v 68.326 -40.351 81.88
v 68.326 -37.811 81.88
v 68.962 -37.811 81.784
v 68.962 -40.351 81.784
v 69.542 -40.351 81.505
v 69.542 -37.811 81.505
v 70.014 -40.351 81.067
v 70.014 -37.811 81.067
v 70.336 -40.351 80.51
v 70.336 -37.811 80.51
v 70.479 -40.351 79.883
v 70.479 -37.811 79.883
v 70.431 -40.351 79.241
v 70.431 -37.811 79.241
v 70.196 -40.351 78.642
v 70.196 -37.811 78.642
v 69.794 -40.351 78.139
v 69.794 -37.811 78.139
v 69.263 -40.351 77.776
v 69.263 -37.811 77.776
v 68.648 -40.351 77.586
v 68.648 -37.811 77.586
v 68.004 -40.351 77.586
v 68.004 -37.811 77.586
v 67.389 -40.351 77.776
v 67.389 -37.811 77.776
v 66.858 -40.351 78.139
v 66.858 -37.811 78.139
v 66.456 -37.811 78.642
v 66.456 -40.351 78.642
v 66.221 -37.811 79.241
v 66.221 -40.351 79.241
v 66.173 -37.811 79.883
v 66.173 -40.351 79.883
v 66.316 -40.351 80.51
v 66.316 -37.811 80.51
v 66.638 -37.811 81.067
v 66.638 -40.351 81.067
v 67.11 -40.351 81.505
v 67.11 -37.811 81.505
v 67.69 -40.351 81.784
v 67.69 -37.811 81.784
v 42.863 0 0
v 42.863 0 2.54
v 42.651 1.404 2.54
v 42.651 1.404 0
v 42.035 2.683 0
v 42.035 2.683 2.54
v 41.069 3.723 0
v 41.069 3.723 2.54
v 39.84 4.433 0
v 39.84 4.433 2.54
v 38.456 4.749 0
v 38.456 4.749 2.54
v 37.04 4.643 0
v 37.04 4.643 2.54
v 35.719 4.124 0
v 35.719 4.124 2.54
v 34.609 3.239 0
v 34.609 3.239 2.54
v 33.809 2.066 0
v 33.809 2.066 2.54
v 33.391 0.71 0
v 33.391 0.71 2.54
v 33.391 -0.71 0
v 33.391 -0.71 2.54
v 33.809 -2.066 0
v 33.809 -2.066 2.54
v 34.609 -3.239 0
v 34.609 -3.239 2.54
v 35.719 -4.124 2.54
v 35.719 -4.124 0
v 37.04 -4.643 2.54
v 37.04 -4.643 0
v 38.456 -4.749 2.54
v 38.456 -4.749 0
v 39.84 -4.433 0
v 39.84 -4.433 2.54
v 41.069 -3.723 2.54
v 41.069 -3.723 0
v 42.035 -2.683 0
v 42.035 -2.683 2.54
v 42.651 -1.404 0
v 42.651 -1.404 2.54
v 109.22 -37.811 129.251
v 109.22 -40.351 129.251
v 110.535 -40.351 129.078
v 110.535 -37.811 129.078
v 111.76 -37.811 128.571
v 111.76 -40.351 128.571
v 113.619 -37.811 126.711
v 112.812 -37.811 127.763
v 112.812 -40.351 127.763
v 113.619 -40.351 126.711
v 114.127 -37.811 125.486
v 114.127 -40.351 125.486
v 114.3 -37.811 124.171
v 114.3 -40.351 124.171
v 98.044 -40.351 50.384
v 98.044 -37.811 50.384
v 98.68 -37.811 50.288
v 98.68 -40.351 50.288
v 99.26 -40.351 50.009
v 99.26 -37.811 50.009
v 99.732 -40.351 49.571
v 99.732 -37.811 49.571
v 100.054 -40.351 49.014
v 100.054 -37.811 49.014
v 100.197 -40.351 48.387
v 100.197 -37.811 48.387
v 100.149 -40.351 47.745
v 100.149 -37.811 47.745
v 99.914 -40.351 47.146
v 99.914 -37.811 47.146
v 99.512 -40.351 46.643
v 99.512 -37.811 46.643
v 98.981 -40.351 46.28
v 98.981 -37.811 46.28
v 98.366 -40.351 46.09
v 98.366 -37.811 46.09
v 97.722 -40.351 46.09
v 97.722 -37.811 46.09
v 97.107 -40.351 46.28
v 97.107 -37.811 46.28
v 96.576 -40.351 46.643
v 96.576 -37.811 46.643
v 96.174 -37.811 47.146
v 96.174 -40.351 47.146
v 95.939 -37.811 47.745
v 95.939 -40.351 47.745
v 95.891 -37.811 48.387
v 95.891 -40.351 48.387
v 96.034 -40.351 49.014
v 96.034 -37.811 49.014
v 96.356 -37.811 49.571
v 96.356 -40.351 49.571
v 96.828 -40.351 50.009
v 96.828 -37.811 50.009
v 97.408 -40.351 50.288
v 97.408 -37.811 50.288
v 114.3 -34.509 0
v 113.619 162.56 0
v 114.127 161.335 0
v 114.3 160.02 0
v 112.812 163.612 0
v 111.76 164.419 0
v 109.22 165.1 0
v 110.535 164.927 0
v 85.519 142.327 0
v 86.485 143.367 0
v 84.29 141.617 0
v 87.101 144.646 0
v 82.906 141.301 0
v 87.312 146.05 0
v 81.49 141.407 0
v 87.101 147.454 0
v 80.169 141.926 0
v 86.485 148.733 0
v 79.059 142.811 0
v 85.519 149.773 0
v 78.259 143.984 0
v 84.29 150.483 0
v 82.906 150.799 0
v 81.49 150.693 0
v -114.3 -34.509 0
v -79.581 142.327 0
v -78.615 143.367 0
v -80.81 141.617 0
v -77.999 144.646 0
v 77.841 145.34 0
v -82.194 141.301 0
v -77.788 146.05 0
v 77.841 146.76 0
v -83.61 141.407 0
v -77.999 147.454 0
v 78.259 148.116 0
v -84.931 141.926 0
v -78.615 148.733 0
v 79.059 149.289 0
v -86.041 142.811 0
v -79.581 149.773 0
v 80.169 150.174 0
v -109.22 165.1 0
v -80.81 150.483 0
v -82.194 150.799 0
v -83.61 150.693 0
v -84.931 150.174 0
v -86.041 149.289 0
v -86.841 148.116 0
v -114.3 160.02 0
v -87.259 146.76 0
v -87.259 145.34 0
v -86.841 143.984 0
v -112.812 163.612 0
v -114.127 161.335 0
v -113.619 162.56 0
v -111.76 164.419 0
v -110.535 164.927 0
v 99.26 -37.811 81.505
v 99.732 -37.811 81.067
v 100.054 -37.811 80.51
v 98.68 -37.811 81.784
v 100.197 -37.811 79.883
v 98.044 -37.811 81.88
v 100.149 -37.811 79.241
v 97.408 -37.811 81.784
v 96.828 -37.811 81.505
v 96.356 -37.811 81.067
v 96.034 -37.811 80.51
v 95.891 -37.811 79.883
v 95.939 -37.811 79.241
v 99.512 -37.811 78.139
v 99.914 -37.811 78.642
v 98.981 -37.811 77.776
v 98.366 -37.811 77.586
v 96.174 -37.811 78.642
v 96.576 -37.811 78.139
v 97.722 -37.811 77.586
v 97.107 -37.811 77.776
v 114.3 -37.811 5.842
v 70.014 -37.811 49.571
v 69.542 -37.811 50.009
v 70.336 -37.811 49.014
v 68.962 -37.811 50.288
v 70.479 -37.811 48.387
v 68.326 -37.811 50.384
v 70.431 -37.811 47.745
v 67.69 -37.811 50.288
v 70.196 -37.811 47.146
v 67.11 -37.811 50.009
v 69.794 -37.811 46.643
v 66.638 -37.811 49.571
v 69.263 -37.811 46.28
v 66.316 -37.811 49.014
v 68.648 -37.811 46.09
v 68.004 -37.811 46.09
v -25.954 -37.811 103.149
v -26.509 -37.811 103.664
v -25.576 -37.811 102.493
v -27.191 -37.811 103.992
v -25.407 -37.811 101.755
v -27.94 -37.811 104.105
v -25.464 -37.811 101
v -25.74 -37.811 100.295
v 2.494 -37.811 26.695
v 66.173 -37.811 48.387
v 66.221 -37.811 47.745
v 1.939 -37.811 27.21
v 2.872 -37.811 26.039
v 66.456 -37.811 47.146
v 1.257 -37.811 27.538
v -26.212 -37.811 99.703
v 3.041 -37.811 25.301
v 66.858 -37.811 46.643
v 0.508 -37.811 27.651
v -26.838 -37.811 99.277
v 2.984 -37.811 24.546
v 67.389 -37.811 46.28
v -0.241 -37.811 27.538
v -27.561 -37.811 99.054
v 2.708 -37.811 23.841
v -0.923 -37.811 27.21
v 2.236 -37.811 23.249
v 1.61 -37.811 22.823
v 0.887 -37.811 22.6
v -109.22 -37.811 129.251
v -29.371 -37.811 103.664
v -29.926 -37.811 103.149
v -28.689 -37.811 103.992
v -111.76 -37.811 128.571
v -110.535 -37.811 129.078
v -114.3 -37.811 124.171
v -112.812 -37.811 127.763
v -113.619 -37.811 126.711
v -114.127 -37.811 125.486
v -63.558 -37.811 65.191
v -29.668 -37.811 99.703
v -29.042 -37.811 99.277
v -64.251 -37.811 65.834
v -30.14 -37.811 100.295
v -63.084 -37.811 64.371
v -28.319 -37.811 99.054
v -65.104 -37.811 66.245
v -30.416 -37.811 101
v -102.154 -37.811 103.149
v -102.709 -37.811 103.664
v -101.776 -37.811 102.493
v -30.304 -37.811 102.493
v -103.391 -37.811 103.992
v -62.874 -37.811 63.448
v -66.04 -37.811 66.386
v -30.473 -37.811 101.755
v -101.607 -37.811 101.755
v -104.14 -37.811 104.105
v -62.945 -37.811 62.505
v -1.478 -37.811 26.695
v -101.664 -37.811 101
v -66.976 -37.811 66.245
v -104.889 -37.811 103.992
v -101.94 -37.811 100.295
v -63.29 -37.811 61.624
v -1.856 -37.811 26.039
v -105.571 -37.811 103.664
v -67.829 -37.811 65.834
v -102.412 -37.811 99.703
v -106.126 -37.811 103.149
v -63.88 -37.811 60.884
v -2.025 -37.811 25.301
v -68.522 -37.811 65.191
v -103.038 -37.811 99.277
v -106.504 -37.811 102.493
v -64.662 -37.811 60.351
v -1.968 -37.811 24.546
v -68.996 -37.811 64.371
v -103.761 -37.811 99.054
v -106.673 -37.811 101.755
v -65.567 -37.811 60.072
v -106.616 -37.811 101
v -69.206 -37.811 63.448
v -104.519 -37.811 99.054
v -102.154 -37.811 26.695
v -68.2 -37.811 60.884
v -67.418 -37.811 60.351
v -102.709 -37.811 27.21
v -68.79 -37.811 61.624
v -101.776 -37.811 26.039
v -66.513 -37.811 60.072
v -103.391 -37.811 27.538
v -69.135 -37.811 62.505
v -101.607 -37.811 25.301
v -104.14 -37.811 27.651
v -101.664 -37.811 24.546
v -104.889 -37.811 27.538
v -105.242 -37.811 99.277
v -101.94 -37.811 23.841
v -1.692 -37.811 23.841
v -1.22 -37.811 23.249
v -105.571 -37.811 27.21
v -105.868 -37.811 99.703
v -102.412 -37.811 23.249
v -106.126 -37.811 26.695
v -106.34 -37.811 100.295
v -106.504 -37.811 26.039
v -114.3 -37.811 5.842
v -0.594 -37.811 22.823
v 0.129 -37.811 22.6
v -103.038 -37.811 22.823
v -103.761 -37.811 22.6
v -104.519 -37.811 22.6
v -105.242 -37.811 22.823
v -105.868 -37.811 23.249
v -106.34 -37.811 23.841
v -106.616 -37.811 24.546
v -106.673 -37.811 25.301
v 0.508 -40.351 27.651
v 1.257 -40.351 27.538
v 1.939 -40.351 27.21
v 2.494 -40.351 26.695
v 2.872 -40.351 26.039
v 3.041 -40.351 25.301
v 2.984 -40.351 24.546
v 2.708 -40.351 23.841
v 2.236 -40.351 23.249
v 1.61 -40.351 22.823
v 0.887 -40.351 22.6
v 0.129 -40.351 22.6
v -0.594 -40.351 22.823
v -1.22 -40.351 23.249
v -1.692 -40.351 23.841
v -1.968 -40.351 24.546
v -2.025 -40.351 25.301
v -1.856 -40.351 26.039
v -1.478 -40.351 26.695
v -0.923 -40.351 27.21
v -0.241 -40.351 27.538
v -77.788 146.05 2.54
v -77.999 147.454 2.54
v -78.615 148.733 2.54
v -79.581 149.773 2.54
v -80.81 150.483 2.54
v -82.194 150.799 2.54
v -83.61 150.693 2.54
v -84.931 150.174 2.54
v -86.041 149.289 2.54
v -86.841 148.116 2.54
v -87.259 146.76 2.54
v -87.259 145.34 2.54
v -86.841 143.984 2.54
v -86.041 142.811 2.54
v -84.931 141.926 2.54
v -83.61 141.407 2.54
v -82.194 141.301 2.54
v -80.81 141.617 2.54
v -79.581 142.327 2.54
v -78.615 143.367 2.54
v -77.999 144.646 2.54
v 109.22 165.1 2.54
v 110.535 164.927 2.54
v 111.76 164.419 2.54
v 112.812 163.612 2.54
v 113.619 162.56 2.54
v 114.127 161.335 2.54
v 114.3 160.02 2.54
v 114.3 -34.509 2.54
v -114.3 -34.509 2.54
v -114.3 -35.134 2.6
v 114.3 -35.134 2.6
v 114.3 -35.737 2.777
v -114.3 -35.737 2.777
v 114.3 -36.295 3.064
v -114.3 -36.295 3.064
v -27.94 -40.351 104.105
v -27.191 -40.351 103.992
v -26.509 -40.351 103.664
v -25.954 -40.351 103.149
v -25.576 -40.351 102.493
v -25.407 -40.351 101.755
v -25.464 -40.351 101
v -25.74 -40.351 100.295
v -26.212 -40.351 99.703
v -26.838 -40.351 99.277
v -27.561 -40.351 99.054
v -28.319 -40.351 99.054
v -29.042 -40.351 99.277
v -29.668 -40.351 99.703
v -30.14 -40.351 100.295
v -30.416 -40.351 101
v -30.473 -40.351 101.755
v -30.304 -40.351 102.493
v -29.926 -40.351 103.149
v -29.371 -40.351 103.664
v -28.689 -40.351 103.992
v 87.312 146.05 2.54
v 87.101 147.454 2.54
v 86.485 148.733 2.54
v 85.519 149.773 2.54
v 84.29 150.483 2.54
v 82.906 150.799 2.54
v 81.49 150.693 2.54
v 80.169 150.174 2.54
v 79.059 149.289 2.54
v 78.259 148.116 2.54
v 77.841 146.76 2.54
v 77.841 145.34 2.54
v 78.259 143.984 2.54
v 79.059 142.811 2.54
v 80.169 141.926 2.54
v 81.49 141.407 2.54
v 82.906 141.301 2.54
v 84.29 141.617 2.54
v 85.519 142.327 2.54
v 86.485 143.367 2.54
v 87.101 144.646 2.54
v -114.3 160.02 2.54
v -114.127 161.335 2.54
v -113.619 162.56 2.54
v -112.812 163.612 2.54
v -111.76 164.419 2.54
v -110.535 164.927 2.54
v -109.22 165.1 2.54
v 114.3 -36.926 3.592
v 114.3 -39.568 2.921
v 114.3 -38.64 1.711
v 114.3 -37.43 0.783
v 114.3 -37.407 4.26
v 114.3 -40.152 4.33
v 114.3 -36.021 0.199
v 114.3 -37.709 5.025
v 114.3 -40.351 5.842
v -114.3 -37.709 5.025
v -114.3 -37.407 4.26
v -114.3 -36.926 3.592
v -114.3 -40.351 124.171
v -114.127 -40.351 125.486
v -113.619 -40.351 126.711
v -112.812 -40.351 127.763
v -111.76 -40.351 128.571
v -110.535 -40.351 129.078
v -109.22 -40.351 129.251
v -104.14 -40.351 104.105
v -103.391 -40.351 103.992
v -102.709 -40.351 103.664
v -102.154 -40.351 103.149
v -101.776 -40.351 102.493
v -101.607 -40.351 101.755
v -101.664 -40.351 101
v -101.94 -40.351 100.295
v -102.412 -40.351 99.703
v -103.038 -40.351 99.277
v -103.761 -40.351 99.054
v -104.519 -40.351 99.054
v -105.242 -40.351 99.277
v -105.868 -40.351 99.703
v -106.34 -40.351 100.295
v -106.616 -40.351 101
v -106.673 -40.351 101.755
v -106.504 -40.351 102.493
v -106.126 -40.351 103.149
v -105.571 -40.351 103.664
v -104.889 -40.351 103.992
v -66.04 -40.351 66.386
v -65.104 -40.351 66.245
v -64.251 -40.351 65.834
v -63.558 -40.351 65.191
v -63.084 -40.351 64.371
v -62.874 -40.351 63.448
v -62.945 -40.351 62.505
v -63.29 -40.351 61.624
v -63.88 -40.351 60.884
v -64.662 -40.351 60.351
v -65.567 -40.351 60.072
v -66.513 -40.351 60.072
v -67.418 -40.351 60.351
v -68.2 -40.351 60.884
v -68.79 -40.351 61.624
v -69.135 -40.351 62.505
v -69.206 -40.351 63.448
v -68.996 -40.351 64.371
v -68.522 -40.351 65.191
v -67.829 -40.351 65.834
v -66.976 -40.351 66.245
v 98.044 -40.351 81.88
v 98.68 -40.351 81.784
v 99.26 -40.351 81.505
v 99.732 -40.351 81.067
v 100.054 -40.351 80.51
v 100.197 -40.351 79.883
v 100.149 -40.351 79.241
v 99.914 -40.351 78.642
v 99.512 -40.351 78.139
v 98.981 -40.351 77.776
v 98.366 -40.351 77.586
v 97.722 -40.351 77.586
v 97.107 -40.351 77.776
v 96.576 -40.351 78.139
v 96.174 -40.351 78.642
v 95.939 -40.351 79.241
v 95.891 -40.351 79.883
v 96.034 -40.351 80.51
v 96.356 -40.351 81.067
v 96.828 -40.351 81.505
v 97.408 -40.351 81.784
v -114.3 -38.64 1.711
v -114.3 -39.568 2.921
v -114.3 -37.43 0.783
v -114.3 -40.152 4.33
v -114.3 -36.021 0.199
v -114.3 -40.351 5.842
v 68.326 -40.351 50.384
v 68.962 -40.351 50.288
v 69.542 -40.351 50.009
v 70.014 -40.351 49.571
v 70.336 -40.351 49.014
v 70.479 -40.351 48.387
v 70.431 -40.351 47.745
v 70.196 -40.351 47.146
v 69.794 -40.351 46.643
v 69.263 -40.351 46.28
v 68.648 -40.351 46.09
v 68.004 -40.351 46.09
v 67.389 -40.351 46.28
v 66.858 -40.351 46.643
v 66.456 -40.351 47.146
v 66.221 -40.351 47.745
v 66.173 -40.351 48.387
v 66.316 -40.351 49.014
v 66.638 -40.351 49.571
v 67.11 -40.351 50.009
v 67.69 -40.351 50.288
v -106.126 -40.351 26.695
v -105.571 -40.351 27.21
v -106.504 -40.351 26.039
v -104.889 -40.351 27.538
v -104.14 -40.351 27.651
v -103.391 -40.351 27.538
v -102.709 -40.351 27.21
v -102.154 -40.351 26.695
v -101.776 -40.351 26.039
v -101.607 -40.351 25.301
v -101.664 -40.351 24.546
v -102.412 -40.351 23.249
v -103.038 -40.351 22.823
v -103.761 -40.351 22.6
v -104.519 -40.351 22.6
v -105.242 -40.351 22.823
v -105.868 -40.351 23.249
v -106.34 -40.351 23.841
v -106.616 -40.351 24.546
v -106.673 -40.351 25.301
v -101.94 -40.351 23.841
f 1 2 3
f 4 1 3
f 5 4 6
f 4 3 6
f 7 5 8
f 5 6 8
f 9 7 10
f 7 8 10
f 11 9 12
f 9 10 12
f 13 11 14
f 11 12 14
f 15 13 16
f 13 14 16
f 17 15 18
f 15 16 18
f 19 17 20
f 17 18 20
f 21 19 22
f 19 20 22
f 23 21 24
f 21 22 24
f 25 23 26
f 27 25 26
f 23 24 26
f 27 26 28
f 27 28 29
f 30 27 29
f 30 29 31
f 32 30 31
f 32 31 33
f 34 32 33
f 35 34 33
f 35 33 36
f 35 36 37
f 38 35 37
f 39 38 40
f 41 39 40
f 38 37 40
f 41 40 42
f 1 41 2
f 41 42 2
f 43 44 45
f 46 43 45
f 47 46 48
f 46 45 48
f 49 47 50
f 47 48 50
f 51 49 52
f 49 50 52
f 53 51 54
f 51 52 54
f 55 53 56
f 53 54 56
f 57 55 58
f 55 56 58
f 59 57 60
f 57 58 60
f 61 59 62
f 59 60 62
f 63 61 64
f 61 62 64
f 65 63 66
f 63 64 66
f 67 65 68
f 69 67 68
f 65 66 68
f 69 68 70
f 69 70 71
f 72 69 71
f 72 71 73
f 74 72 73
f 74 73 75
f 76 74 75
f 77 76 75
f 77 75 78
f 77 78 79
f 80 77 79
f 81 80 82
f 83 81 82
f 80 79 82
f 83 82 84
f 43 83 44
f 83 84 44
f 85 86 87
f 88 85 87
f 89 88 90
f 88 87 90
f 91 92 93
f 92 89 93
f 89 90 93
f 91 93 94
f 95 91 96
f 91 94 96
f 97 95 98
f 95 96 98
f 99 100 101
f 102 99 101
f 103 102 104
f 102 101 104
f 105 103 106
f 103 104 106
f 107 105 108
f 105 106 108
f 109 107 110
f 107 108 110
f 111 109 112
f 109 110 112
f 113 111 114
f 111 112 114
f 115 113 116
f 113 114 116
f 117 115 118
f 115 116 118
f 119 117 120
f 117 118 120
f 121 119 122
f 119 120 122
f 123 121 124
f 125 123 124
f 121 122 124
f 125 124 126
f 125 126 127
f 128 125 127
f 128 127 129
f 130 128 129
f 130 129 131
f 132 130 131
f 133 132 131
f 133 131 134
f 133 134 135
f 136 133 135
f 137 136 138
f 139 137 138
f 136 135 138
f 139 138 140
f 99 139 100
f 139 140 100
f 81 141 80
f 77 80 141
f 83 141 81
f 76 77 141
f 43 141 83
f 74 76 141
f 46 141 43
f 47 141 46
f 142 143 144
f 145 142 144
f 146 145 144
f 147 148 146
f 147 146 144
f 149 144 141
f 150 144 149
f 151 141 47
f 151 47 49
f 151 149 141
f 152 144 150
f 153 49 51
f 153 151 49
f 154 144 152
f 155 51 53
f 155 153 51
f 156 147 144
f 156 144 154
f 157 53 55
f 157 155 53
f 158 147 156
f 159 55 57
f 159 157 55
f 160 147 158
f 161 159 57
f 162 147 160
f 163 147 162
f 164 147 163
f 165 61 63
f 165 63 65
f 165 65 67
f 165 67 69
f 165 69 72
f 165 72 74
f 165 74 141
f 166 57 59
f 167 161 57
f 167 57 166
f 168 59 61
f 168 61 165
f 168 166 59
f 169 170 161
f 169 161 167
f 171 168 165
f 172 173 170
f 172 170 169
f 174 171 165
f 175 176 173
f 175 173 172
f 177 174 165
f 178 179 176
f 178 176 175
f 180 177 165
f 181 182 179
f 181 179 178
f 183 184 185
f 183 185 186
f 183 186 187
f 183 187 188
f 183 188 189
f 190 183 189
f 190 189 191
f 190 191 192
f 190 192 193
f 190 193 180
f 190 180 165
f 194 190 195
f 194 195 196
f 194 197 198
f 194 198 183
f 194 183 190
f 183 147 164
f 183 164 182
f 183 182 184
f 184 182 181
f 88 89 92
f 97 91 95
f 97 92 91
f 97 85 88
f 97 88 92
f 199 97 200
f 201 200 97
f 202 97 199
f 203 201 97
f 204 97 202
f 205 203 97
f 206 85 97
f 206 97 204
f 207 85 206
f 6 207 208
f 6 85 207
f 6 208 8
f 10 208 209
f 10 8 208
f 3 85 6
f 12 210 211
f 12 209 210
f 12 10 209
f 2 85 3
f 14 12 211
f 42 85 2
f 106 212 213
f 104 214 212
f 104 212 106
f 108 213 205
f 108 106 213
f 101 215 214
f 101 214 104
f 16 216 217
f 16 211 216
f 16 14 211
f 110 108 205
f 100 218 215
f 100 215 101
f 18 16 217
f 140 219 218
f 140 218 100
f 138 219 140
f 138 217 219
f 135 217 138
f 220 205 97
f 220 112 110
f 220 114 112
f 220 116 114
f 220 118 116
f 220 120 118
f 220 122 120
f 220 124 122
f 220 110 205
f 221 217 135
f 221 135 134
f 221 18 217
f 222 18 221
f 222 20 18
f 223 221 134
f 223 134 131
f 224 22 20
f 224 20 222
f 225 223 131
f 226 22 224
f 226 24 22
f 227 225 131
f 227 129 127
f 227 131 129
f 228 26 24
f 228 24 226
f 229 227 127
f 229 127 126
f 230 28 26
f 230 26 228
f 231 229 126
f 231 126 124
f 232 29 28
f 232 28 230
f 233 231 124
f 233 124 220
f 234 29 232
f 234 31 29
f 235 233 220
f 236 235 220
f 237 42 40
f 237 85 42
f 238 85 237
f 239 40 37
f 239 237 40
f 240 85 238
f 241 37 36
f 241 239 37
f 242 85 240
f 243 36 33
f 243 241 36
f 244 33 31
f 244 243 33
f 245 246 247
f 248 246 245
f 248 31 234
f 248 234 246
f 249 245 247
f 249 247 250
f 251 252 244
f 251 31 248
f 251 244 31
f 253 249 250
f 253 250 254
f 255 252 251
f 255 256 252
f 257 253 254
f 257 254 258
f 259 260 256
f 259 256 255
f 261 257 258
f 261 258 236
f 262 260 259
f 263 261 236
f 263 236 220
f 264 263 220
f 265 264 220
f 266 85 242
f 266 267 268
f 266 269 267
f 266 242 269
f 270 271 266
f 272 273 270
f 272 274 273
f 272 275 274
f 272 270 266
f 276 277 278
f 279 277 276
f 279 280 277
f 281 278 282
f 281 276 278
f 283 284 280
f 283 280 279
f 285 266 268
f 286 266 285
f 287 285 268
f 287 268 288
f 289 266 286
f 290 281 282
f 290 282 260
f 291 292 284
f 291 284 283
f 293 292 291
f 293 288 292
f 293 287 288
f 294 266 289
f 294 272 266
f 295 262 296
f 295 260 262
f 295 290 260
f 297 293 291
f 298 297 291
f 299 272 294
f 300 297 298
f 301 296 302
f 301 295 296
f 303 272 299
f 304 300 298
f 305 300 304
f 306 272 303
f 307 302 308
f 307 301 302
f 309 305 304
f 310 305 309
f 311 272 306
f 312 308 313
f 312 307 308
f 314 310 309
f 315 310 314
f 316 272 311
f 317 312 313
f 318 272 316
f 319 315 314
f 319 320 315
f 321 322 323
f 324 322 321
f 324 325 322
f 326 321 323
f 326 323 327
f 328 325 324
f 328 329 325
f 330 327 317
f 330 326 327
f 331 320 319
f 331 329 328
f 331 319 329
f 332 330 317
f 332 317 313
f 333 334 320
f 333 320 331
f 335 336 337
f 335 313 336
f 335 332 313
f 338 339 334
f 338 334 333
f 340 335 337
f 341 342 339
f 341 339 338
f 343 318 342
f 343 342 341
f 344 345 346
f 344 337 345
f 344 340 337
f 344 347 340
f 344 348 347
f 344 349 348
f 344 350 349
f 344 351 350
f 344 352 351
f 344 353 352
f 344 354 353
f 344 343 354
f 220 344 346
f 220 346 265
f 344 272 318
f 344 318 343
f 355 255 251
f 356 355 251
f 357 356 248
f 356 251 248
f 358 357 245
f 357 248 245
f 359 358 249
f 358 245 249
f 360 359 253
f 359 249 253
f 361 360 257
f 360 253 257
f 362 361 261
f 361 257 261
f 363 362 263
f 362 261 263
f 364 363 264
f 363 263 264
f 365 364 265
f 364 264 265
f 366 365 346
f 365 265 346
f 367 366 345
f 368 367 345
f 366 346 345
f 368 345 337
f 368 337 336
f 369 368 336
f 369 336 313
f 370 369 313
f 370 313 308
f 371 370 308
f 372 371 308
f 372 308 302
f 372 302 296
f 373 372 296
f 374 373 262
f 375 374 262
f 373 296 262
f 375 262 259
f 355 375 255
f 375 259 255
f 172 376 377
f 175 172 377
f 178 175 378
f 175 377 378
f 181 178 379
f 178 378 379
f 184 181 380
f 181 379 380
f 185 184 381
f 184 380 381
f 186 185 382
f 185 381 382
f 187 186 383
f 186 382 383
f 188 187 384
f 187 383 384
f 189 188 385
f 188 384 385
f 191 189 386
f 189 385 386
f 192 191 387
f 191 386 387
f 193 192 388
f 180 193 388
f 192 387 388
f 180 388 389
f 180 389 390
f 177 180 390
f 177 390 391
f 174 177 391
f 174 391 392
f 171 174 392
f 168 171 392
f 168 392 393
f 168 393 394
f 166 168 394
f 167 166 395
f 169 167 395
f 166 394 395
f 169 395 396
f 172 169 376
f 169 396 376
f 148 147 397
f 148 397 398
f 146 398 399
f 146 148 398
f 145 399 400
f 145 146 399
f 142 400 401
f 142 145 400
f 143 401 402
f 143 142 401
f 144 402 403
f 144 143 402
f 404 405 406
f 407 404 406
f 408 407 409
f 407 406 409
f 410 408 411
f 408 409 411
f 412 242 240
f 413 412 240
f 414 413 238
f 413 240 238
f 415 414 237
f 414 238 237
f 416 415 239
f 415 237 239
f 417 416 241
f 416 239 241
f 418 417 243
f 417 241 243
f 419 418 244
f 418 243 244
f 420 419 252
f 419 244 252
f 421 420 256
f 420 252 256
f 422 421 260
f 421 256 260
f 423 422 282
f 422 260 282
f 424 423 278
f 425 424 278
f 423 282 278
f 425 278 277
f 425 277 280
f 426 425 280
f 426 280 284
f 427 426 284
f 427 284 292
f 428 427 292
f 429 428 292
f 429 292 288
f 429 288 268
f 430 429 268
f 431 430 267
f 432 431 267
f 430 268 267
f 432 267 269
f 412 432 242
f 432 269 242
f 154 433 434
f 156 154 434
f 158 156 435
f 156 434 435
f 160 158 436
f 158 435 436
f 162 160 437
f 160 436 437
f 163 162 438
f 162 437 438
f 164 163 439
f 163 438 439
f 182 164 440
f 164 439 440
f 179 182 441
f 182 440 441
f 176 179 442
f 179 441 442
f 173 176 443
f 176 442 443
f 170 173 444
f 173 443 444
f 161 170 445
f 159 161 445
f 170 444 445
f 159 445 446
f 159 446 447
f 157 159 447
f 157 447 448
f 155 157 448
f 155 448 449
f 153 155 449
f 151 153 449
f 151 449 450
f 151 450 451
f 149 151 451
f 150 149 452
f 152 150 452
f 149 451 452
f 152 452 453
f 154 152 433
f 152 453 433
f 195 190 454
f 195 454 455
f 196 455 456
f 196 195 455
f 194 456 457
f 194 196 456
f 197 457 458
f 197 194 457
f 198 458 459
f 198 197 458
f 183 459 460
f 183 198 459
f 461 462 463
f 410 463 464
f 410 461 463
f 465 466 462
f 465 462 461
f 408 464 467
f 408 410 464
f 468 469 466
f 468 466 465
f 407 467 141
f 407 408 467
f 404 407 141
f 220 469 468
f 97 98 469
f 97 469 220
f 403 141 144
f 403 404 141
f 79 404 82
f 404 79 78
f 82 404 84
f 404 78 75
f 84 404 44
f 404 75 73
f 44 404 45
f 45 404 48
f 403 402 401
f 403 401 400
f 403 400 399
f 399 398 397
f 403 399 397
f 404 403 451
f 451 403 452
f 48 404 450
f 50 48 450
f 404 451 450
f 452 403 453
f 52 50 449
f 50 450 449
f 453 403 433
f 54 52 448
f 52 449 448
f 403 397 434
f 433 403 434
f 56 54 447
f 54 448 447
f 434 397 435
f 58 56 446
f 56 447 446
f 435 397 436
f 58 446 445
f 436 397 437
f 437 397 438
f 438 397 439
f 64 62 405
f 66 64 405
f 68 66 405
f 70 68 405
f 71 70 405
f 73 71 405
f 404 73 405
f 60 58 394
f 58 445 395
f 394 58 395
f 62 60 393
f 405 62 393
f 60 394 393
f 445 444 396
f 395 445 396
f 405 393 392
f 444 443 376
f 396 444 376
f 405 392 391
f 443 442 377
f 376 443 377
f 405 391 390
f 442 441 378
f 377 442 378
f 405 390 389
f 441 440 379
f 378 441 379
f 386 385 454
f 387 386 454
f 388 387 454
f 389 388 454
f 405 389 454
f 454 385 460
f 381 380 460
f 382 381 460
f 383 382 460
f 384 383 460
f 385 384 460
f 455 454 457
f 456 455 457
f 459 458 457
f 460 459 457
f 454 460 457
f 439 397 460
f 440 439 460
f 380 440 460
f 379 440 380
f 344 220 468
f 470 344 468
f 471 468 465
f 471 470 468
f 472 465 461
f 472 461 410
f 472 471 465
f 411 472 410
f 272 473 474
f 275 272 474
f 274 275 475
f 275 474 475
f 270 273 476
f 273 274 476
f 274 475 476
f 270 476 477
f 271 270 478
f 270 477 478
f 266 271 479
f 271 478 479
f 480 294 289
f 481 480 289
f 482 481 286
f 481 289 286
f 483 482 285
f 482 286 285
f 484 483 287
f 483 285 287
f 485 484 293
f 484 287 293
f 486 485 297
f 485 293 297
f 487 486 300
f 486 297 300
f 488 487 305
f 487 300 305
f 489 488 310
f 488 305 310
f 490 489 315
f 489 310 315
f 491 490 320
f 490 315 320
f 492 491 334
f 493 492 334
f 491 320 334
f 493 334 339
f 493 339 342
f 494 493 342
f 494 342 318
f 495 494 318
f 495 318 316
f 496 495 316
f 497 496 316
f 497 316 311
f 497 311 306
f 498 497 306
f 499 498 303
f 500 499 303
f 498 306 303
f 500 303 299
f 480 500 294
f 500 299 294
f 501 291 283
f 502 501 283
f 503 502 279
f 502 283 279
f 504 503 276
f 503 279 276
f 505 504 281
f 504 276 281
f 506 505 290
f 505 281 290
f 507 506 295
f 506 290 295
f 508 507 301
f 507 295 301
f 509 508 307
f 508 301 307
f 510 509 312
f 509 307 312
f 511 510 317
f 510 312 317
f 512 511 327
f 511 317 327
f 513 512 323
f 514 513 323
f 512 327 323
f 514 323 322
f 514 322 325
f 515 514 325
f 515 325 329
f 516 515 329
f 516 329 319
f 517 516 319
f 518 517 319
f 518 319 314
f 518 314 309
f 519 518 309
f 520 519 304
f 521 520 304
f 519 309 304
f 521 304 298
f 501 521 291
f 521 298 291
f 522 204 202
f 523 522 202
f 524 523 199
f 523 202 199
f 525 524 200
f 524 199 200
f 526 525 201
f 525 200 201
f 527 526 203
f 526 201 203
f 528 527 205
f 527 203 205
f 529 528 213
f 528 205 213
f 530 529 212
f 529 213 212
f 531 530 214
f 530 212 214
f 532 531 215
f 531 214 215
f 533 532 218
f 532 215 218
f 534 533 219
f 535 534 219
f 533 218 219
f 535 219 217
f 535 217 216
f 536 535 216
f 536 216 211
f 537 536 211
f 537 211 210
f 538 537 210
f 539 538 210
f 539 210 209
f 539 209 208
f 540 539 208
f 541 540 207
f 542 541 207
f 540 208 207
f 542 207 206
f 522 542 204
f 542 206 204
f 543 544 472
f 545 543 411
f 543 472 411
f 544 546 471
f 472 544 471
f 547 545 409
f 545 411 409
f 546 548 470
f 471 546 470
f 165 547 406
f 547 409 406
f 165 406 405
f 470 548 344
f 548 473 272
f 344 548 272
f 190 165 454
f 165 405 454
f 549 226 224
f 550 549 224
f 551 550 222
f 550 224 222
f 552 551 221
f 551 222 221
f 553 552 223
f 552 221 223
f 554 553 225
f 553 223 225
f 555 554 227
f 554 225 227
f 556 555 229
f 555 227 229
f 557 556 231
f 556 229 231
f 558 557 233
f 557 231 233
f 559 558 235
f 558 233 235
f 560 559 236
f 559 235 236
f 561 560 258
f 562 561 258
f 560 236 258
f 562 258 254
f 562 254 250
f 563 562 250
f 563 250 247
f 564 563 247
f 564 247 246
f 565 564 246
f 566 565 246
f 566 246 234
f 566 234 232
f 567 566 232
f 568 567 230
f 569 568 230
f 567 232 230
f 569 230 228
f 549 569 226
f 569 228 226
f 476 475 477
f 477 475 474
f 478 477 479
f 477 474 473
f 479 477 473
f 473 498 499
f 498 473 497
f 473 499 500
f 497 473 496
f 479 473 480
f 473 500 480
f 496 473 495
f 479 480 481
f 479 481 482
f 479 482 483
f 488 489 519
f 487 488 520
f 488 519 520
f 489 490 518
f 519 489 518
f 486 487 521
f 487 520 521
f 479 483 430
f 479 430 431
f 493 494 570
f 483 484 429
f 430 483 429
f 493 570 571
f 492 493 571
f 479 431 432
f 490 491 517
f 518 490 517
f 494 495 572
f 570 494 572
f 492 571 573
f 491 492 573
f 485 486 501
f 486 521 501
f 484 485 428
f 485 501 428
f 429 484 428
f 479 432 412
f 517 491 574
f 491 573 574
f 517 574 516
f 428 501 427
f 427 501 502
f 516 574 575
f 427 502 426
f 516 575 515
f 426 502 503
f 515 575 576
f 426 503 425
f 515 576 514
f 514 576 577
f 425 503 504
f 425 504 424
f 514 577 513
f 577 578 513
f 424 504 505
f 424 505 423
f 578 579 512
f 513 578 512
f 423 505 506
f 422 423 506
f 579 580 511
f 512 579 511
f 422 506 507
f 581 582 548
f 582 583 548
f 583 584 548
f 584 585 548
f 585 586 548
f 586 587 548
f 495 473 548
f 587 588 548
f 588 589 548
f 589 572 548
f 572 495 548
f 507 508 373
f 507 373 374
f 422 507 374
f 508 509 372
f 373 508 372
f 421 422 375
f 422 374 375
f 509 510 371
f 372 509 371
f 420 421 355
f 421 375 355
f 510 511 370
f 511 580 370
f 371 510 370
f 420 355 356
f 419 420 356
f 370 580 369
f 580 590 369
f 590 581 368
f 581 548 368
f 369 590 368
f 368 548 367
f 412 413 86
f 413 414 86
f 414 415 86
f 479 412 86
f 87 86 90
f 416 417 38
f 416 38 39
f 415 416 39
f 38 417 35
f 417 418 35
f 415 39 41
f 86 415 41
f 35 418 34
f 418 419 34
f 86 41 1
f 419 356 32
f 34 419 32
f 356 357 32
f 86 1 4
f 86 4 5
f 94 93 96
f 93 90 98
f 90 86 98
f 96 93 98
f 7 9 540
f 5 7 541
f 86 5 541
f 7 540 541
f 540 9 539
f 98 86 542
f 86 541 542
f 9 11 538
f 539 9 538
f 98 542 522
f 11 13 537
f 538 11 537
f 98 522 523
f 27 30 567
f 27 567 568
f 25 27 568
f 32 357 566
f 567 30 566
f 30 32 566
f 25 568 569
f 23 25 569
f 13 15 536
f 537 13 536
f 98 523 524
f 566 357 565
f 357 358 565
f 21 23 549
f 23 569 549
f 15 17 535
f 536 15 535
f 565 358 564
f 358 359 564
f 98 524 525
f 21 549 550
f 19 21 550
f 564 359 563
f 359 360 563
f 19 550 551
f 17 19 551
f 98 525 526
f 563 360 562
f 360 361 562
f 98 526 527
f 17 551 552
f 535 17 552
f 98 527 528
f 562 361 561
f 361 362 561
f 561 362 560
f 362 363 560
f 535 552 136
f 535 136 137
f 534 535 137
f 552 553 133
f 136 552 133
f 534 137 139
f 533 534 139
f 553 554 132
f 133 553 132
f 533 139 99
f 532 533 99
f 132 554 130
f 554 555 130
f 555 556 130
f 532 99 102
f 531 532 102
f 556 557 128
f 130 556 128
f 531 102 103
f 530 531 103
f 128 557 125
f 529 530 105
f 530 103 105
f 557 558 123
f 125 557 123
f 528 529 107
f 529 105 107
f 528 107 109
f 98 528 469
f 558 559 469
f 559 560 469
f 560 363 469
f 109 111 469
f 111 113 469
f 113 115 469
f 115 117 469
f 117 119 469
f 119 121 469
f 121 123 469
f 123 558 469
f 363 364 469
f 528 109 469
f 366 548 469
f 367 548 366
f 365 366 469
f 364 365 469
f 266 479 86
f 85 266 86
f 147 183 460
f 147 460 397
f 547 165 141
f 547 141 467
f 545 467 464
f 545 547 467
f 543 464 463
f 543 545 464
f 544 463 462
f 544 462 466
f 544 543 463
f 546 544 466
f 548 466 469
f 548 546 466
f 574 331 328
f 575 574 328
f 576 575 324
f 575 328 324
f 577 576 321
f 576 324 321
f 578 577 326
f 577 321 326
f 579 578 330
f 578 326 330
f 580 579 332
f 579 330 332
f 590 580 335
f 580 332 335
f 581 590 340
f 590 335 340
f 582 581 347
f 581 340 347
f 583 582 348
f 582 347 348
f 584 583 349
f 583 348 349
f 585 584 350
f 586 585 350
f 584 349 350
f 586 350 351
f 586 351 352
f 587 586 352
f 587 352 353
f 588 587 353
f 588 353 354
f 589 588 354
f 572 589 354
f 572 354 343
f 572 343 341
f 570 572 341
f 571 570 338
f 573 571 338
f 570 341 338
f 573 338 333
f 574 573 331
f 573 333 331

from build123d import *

# Parameters (mm, degrees)
BOSS_EXTRUDE1_DEPTH      = 2.54
SKETCHED_START           = -165.1
SKETCHED_BEND1_OUTLINE_W = 228.6
SKETCHED_BEND1_OUTLINE_H = 2.54
SKETCHED_BEND1_DEPTH     = 125.300208363
SKETCHED_START_2         = -40.351159597
SKETCHED_BEND1_2_DEPTH   = 4.05656796
SKETCHED_START_3         = -114.3
SKETCHED_BEND1_3_DEPTH   = 228.6
SKETCHED_BEND1_4_DEPTH   = 228.6
SKETCH8_R                = 2.54
SKETCH8_R_2              = 3.175
SKETCH8_R_3              = 2.159
CUT_EXTRUDE2_DEPTH       = 2.54
SKETCH29_R               = 4.7625
CUT_EXTRUDE3_DEPTH       = 2.54


with BuildPart() as part:
    # Sketch2 → Boss-Extrude1 (new body)
    with BuildSketch(Plane.XY):
        with BuildLine():
            Line((109.22, -165.1), (-109.22, -165.1))
            ThreePointArc((-109.22, -165.1), (-112.812102448, -163.612102448), (-114.3, -160.02))
            Line((-114.3, -160.02), (-114.3, 160.02))
            ThreePointArc((-114.3, 160.02), (-112.812102448, 163.612102448), (-109.22, 165.1))
            Line((-109.22, 165.1), (109.22, 165.1))
            ThreePointArc((109.22, 165.1), (112.812102448, 163.612102448), (114.3, 160.02))
            Line((114.3, 160.02), (114.3, -160.02))
            ThreePointArc((114.3, -160.02), (112.812102448, -163.612102448), (109.22, -165.1))
        make_face()
    extrude(amount=BOSS_EXTRUDE1_DEPTH)

    # Sketched Bend1: read off the stored shape, not the designer's step
    # Sketched Bend1 outline → Sketched Bend1 (cut)
    with BuildSketch(Plane(origin=(0, 0, 0), x_dir=(1, 0, 0), z_dir=(0, 1, 0)).offset(SKETCHED_START)):
        with Locations((0, -1.27)):
            Rectangle(SKETCHED_BEND1_OUTLINE_W, SKETCHED_BEND1_OUTLINE_H)
    extrude(amount=SKETCHED_BEND1_DEPTH, mode=Mode.SUBTRACT)

    # Sketched Bend1 2 outline → Sketched Bend1 2 (add)
    with BuildSketch(Plane(origin=(0, 0, 0), x_dir=(1, 0, 0), z_dir=(0, 1, 0)).offset(SKETCHED_START_2)):
        with BuildLine():
            Line((114.3, -124.171159597), (114.3, -2.54))
            Line((114.3, -2.54), (-114.3, -2.54))
            Line((-114.3, -2.54), (-114.3, -124.171159597))
            ThreePointArc((-114.3, -124.171159597), (-112.812102448, -127.763262045), (-109.22, -129.251159597))
            Line((-109.22, -129.251159597), (109.22, -129.251159597))
            ThreePointArc((109.22, -129.251159597), (112.812102448, -127.763262045), (114.3, -124.171159597))
        make_face()
    extrude(amount=SKETCHED_BEND1_2_DEPTH)

    # Sketched Bend1 3 outline → Sketched Bend1 3 (cut)
    with BuildSketch(Plane.YZ.offset(SKETCHED_START_3)):
        with BuildLine():
            Line((-36.294591637, 129.251159597), (-37.811159597, 129.251159597))
            Line((-37.811159597, 129.251159597), (-37.811159597, 5.842))
            ThreePointArc((-37.811159597, 5.842), (-37.407322859, 4.259642992), (-36.294591637, 3.064332557))
            Line((-36.294591637, 3.064332557), (-36.294591637, 129.251159597))
        make_face()
        with BuildLine():
            ThreePointArc((-34.509159597, 0), (-38.640077413, 1.711082184), (-40.351159597, 5.842))
            Line((-40.351159597, 5.842), (-40.351159597, 2.54))
            Line((-40.351159597, 2.54), (-39.799791637, 2.54))
            Line((-39.799791637, 2.54), (-39.799791637, 0))
            Line((-39.799791637, 0), (-34.509159597, 0))
        make_face()
    extrude(amount=SKETCHED_BEND1_3_DEPTH, mode=Mode.SUBTRACT)

    # Sketched Bend1 4 outline → Sketched Bend1 4 (add)
    with BuildSketch(Plane.YZ.offset(SKETCHED_START_3)):
        with BuildLine():
            ThreePointArc((-34.509159597, 2.54), (-35.439575122, 2.673793733), (-36.294591637, 3.064332557))
            Line((-36.294591637, 3.064332557), (-36.294591637, 2.54))
            Line((-36.294591637, 2.54), (-34.509159597, 2.54))
        make_face()
    extrude(amount=SKETCHED_BEND1_4_DEPTH)

    # Sketch8 → Cut-Extrude2 (cut)
    with BuildSketch(Plane(origin=(0, -37.811159597, 0), x_dir=(1, 0, 0), z_dir=(0, 1, 0))):
        with Locations(Location((-104.14, -25.111159597, 0), (0, 0, 270))):
            Circle(SKETCH8_R)
        with Locations(Location((0.508, -25.111159597, 0), (0, 0, 270))):
            Circle(SKETCH8_R)
        with Locations(Location((-104.14, -101.565159597, 0), (0, 0, 270))):
            Circle(SKETCH8_R)
        with Locations(Location((-27.94, -101.565159597, 0), (0, 0, 270))):
            Circle(SKETCH8_R)
        with Locations(Location((-66.04, -63.211159597, 0), (0, 0, 270))):
            Circle(SKETCH8_R_2)
        with Locations(Location((68.326, -48.225159597, 0), (0, 0, 270))):
            Circle(SKETCH8_R_3)
        with Locations(Location((98.044, -48.225159597, 0), (0, 0, 270))):
            Circle(SKETCH8_R_3)
        with Locations(Location((98.044, -79.721159597, 0), (0, 0, 270))):
            Circle(SKETCH8_R_3)
        with Locations(Location((68.326, -79.721159597, 0), (0, 0, 270))):
            Circle(SKETCH8_R_3)
    extrude(amount=-CUT_EXTRUDE2_DEPTH, mode=Mode.SUBTRACT)

    # Sketch29 → Cut-Extrude3 (cut)
    with BuildSketch(Plane.XY.offset(2.54)):
        with Locations((-82.55, 146.05)):
            Circle(SKETCH29_R)
        with Locations((82.55, 146.05)):
            Circle(SKETCH29_R)
        with Locations((38.1, 0)):
            Circle(SKETCH29_R)
    extrude(amount=-CUT_EXTRUDE3_DEPTH, mode=Mode.SUBTRACT)


solid = part.part
